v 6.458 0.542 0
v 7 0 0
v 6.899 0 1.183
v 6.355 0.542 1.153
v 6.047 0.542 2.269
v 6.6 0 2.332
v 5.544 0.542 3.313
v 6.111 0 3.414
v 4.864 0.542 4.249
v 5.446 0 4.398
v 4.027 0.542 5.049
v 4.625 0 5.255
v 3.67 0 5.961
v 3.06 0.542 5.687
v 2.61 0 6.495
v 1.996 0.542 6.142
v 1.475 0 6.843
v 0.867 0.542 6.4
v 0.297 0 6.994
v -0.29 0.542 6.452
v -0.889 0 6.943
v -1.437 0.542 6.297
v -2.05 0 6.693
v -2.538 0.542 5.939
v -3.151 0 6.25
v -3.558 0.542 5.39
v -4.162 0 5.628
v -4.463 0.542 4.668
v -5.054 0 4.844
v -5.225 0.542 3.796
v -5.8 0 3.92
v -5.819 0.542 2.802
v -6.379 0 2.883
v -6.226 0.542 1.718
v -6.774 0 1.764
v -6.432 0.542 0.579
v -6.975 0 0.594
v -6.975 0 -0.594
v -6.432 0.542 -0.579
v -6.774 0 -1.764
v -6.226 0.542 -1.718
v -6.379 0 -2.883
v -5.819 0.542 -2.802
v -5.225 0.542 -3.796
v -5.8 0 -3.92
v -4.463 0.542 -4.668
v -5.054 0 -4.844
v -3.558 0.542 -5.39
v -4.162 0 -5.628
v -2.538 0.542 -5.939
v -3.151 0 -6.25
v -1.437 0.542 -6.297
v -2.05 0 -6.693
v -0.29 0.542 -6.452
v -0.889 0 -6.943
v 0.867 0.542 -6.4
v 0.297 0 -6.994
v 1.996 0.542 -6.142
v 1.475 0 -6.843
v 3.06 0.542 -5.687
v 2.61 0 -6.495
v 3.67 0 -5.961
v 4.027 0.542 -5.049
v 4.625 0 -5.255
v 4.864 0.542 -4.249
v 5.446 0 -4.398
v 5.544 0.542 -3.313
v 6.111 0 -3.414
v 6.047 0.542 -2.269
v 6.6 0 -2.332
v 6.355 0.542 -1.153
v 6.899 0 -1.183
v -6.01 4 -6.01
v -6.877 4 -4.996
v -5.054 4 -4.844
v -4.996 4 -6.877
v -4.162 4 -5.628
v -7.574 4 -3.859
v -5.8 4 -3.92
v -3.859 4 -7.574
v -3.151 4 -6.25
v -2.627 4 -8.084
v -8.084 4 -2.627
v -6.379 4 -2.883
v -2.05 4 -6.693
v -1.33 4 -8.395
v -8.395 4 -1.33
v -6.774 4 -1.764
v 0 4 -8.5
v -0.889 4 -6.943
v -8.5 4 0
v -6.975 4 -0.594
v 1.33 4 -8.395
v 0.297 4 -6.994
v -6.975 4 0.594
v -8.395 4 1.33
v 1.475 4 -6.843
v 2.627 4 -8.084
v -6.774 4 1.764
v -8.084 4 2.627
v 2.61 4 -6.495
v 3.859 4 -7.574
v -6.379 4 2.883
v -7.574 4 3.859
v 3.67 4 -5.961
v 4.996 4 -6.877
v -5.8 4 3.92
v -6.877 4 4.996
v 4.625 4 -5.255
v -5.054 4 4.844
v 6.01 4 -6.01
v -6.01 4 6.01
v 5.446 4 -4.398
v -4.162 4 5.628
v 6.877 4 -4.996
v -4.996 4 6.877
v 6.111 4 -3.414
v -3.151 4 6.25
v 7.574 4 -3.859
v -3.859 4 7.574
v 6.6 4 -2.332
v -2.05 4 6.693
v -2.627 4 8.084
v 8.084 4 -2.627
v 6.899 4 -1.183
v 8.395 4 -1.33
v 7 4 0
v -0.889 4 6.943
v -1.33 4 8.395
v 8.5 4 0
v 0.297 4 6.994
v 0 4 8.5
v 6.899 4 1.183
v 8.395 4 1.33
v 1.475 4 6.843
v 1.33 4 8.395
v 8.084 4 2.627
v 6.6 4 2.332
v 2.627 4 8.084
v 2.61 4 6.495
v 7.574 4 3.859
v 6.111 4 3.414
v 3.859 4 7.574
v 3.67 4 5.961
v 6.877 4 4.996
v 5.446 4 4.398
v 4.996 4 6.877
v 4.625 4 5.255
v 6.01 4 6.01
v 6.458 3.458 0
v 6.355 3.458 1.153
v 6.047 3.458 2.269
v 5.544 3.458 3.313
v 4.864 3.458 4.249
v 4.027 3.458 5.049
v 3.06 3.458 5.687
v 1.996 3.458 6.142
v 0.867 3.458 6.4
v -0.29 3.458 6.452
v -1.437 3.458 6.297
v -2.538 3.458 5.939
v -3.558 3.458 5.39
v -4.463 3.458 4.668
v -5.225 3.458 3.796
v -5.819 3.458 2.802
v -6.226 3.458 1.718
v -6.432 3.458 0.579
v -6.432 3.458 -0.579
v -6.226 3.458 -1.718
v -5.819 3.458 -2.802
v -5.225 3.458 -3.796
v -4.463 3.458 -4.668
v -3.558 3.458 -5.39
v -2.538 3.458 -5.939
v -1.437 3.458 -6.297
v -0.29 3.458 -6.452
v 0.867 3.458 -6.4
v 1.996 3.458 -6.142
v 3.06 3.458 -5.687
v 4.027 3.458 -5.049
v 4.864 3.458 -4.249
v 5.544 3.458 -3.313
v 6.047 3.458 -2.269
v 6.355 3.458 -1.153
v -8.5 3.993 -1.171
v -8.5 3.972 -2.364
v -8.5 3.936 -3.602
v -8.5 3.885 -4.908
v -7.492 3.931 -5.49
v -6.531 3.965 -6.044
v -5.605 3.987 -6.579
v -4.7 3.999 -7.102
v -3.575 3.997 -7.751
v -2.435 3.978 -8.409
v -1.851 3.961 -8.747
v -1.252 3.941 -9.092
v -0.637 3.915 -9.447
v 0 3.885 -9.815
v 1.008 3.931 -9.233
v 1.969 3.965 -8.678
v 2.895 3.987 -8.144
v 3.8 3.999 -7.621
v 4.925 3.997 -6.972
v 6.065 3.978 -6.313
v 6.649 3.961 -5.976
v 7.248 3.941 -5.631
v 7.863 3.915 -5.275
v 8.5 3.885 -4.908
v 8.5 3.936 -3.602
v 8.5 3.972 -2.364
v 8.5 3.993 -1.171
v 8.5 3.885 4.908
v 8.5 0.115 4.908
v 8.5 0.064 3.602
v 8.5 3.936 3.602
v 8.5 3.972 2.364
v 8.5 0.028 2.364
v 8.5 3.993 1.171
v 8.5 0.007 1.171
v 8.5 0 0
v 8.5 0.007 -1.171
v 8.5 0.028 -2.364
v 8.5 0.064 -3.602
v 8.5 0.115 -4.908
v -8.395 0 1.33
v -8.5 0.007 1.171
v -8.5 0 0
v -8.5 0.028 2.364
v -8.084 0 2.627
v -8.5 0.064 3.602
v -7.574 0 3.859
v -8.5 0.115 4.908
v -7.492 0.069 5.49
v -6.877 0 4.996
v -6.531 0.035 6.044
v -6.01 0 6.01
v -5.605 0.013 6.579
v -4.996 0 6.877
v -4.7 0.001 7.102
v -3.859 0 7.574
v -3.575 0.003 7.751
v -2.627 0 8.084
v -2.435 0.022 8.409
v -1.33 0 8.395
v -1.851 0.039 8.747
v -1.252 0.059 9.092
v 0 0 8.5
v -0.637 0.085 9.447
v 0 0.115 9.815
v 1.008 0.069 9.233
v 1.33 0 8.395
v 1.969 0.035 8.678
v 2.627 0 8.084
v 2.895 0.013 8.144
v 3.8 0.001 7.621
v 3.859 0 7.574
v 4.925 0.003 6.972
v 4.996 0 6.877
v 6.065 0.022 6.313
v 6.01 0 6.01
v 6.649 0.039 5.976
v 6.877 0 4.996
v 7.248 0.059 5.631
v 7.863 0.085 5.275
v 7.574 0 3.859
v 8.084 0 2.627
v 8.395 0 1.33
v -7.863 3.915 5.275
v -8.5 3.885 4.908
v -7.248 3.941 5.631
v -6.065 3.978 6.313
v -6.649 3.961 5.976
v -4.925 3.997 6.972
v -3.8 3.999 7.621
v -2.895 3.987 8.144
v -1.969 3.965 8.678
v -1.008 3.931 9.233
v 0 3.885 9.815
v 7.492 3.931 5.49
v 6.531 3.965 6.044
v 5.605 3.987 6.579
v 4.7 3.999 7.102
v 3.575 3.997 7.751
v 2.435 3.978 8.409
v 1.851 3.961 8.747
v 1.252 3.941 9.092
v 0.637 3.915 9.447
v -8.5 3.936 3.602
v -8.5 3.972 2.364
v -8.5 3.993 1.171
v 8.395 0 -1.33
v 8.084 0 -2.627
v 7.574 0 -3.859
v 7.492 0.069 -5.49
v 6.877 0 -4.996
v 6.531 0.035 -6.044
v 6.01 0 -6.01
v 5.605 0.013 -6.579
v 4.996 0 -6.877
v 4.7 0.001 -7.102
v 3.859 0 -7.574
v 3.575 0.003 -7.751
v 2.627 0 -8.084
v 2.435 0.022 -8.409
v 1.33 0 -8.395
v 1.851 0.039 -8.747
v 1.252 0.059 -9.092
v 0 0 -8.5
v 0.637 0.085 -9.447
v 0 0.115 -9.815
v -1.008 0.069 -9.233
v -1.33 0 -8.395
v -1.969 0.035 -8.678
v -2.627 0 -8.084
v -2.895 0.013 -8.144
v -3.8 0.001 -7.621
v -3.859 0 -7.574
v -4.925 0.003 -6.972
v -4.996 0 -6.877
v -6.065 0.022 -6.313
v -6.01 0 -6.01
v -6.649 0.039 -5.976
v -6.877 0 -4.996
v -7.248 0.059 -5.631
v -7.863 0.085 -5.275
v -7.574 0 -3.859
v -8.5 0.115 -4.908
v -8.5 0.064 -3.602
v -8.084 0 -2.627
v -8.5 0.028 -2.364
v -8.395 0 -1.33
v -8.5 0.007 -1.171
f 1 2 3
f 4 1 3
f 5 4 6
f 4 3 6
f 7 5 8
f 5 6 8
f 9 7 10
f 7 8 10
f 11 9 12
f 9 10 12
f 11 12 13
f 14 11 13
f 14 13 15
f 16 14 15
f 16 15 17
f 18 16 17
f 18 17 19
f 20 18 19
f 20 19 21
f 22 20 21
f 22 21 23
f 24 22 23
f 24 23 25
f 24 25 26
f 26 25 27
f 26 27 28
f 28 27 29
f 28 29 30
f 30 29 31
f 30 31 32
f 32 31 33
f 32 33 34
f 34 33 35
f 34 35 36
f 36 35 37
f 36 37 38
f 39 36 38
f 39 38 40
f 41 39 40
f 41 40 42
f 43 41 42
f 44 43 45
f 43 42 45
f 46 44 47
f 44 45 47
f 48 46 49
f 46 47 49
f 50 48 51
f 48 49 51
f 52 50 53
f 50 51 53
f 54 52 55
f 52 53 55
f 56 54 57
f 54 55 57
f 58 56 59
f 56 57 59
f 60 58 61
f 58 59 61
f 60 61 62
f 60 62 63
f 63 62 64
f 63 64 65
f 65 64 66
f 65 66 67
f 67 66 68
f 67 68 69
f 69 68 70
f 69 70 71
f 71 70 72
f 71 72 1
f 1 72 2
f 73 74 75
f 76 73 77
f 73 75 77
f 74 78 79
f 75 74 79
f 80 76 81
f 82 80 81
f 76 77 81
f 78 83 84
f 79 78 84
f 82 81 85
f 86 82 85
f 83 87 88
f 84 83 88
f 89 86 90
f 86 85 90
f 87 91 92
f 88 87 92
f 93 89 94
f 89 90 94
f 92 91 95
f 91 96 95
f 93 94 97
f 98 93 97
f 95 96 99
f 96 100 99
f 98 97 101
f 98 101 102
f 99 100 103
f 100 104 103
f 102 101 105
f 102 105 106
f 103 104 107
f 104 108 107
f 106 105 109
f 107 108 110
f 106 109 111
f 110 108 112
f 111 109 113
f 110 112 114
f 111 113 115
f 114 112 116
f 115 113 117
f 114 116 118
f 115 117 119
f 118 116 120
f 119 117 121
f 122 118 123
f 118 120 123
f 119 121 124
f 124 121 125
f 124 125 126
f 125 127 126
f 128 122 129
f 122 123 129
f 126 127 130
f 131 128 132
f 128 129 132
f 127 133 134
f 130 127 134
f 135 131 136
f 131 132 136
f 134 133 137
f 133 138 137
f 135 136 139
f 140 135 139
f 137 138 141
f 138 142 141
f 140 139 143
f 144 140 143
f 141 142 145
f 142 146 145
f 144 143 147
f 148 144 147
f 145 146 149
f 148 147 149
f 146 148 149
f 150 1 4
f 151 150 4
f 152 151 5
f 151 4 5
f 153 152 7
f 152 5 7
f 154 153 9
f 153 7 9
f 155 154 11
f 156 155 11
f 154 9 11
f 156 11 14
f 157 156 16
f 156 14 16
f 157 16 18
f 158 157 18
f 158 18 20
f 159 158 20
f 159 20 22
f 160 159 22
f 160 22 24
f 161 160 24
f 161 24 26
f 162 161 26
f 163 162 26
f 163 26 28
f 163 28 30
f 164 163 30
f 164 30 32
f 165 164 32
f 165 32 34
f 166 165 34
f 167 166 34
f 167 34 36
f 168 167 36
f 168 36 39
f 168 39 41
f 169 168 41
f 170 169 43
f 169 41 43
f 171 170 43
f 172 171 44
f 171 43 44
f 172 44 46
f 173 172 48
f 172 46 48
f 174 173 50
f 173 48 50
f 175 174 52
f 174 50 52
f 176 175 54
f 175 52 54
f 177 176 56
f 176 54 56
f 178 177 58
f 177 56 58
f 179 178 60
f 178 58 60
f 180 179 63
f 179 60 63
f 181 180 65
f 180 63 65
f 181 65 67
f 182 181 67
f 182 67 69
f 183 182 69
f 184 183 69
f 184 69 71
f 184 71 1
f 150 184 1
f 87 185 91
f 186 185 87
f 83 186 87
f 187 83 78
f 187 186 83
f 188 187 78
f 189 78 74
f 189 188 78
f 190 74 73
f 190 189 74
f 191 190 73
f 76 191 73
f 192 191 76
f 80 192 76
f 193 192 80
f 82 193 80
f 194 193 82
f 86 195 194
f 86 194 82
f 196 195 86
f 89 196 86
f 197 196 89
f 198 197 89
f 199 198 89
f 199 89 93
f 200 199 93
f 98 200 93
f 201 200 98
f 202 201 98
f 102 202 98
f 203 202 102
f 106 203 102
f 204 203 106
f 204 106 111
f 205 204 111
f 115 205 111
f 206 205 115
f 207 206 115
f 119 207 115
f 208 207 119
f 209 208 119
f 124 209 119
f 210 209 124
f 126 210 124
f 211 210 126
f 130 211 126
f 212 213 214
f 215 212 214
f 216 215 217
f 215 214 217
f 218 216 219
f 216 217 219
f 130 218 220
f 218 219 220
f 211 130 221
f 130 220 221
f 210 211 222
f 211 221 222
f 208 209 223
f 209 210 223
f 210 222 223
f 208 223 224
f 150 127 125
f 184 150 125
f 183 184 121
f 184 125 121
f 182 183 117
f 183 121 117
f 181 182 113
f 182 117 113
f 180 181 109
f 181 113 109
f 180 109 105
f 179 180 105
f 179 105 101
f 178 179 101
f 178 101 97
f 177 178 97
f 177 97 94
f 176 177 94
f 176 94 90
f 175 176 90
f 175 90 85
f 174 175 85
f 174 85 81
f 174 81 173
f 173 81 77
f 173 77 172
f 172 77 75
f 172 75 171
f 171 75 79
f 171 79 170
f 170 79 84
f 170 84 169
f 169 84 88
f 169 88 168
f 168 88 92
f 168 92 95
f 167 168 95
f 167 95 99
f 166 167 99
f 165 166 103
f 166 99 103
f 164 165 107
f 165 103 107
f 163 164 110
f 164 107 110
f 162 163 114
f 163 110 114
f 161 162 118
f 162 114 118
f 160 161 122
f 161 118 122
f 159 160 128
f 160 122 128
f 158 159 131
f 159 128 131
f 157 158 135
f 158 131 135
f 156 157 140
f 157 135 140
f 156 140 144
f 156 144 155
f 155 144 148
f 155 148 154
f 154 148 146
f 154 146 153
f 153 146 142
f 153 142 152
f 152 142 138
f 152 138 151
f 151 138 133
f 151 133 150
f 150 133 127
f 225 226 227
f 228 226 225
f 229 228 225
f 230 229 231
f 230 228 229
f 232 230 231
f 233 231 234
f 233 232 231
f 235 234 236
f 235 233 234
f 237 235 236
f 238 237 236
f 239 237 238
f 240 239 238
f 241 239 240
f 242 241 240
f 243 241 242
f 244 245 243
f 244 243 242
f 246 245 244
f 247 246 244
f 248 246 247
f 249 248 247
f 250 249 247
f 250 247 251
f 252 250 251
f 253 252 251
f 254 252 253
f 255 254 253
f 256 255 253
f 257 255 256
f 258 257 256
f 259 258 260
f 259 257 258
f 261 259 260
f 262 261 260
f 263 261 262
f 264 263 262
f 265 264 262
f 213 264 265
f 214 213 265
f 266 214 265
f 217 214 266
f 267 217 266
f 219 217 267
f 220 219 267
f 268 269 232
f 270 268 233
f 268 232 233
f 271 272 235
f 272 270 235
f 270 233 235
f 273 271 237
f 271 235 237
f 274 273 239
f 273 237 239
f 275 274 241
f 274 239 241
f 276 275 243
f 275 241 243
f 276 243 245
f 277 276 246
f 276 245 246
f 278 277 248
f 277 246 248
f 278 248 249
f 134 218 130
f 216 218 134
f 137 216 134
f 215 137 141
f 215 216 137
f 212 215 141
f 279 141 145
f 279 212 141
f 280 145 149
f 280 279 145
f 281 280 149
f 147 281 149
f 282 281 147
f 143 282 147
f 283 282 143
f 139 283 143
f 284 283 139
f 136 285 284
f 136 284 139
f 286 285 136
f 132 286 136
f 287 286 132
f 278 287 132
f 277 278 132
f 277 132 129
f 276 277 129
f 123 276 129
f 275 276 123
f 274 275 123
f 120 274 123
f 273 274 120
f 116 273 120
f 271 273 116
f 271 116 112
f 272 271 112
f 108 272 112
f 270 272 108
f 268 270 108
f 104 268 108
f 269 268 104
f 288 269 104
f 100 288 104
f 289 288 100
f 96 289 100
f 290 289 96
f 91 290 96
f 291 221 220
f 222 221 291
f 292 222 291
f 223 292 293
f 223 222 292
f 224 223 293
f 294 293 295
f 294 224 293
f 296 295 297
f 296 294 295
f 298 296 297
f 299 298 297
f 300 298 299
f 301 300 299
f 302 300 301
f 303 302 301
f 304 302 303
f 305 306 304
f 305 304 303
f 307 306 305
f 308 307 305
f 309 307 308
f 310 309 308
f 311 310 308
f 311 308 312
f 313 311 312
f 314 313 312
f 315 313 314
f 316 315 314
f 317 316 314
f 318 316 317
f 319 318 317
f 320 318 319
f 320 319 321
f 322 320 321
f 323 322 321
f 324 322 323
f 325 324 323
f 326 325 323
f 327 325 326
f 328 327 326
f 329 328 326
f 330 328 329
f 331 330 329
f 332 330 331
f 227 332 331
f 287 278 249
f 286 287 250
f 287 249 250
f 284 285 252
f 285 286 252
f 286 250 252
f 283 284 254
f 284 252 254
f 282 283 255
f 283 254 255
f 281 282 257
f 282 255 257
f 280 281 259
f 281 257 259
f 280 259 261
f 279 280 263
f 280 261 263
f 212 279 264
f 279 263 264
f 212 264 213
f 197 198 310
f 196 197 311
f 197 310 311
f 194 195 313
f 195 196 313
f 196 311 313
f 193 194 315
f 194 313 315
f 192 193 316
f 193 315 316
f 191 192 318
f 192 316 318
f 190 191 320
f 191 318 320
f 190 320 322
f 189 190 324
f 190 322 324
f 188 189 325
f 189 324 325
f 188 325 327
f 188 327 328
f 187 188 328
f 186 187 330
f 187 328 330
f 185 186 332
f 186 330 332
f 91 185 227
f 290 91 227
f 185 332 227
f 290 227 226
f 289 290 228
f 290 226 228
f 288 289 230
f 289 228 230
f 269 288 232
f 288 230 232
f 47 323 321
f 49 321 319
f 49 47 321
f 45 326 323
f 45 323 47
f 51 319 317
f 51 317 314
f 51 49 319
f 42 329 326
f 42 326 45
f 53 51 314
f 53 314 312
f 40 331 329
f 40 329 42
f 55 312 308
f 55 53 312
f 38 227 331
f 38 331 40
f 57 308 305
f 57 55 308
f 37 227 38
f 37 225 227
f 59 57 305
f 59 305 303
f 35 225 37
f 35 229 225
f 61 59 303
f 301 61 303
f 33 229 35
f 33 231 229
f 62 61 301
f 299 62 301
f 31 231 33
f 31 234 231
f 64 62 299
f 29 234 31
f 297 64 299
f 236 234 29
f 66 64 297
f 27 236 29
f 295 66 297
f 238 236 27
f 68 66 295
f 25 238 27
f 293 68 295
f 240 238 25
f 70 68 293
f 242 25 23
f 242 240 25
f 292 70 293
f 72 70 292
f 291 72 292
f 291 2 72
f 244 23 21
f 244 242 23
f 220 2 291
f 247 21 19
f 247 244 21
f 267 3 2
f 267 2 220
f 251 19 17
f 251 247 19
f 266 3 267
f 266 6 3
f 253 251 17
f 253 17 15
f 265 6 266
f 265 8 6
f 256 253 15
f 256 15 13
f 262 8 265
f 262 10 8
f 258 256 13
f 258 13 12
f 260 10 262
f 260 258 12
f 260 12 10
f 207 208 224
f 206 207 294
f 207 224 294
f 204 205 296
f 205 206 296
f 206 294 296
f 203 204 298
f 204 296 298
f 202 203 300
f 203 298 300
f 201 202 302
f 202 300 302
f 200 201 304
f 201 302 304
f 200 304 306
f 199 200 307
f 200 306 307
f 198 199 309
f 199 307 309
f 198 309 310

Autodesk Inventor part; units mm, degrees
sketch "Skizze_1" plane through (0, 0, 0) normal (0, 0, 1) x (1, 0, 0)
  line L0 (0, 0) -> (0, 4)
  line L1 (0, 4) -> (8.5, 4)
  line L2 (8.5, 4) -> (12.75, 3.6282)
  line L3 (12.75, 3.6282) -> (12.75, 0.3718)
  line L4 (12.75, 0.3718) -> (8.5, 0)
  line L5 (8.5, 0) -> (0, 0)
  line L6 (0, 0) -> (0, 4)
revolve "Revolution1" add sketch "Skizze_1" angle 360 about axis through (0, 0, 0) along (0, -1, 0)
sketch "Skizze_2" plane through (0, 4, 0) normal (0, 1, 0) x (1, 0, 0)
  line L0 (-17, 17) -> (-17, -17)
  line L1 (-17, -17) -> (17, -17)
  line L2 (17, -17) -> (17, 17)
  line L3 (17, 17) -> (-17, 17)
  line L4 (-8.5, -4.9075) -> (0, -9.815)
  line L5 (0, -9.815) -> (8.5, -4.9075)
  line L6 (8.5, -4.9075) -> (8.5, 4.9075)
  line L7 (8.5, 4.9075) -> (0, 9.815)
  line L8 (0, 9.815) -> (-8.5, 4.9075)
  line L9 (-8.5, 4.9075) -> (-8.5, -4.9075)
extrude "Extrusion1" cut sketch "Skizze_2" along normal mid plane 8
sketch "Sketch_1" plane through (0, 0, 0) normal (0, 0, 1) x (1, 0, 0)
  line L0 (0, 0) -> (0, 4)
  line L1 (0, 4) -> (7, 4)
  line L2 (7, 4) -> (6.4585, 3.4585)
  line L3 (6.4585, 3.4585) -> (6.4585, 0.5415)
  line L4 (6.4585, 0.5415) -> (7, 0)
  line L5 (7, 0) -> (0, 0)
  line L6 (0, 0) -> (0, 4)
revolve "Revolution2" cut sketch "Sketch_1" angle 360 about axis through (0, 0, 0) along (0, -1, 0)
thread "Thread1" size "M14x1" class "6H" standard "ISO Metric profile" full length
ref_plane "ANBAU_XY" through (0, 0, 0) normal (0, 1, 0) x (1, 0, 0)
ref_plane "ANBAU_YZ" through (0, 0, 0) normal (1, 0, 0) x (0, 0, -1)
ref_plane "ANBAU_ZX" through (0, 0, 0) normal (0, 0, -1) x (0, 1, 0)
properties part number "130519 ESHM-M14x1"
